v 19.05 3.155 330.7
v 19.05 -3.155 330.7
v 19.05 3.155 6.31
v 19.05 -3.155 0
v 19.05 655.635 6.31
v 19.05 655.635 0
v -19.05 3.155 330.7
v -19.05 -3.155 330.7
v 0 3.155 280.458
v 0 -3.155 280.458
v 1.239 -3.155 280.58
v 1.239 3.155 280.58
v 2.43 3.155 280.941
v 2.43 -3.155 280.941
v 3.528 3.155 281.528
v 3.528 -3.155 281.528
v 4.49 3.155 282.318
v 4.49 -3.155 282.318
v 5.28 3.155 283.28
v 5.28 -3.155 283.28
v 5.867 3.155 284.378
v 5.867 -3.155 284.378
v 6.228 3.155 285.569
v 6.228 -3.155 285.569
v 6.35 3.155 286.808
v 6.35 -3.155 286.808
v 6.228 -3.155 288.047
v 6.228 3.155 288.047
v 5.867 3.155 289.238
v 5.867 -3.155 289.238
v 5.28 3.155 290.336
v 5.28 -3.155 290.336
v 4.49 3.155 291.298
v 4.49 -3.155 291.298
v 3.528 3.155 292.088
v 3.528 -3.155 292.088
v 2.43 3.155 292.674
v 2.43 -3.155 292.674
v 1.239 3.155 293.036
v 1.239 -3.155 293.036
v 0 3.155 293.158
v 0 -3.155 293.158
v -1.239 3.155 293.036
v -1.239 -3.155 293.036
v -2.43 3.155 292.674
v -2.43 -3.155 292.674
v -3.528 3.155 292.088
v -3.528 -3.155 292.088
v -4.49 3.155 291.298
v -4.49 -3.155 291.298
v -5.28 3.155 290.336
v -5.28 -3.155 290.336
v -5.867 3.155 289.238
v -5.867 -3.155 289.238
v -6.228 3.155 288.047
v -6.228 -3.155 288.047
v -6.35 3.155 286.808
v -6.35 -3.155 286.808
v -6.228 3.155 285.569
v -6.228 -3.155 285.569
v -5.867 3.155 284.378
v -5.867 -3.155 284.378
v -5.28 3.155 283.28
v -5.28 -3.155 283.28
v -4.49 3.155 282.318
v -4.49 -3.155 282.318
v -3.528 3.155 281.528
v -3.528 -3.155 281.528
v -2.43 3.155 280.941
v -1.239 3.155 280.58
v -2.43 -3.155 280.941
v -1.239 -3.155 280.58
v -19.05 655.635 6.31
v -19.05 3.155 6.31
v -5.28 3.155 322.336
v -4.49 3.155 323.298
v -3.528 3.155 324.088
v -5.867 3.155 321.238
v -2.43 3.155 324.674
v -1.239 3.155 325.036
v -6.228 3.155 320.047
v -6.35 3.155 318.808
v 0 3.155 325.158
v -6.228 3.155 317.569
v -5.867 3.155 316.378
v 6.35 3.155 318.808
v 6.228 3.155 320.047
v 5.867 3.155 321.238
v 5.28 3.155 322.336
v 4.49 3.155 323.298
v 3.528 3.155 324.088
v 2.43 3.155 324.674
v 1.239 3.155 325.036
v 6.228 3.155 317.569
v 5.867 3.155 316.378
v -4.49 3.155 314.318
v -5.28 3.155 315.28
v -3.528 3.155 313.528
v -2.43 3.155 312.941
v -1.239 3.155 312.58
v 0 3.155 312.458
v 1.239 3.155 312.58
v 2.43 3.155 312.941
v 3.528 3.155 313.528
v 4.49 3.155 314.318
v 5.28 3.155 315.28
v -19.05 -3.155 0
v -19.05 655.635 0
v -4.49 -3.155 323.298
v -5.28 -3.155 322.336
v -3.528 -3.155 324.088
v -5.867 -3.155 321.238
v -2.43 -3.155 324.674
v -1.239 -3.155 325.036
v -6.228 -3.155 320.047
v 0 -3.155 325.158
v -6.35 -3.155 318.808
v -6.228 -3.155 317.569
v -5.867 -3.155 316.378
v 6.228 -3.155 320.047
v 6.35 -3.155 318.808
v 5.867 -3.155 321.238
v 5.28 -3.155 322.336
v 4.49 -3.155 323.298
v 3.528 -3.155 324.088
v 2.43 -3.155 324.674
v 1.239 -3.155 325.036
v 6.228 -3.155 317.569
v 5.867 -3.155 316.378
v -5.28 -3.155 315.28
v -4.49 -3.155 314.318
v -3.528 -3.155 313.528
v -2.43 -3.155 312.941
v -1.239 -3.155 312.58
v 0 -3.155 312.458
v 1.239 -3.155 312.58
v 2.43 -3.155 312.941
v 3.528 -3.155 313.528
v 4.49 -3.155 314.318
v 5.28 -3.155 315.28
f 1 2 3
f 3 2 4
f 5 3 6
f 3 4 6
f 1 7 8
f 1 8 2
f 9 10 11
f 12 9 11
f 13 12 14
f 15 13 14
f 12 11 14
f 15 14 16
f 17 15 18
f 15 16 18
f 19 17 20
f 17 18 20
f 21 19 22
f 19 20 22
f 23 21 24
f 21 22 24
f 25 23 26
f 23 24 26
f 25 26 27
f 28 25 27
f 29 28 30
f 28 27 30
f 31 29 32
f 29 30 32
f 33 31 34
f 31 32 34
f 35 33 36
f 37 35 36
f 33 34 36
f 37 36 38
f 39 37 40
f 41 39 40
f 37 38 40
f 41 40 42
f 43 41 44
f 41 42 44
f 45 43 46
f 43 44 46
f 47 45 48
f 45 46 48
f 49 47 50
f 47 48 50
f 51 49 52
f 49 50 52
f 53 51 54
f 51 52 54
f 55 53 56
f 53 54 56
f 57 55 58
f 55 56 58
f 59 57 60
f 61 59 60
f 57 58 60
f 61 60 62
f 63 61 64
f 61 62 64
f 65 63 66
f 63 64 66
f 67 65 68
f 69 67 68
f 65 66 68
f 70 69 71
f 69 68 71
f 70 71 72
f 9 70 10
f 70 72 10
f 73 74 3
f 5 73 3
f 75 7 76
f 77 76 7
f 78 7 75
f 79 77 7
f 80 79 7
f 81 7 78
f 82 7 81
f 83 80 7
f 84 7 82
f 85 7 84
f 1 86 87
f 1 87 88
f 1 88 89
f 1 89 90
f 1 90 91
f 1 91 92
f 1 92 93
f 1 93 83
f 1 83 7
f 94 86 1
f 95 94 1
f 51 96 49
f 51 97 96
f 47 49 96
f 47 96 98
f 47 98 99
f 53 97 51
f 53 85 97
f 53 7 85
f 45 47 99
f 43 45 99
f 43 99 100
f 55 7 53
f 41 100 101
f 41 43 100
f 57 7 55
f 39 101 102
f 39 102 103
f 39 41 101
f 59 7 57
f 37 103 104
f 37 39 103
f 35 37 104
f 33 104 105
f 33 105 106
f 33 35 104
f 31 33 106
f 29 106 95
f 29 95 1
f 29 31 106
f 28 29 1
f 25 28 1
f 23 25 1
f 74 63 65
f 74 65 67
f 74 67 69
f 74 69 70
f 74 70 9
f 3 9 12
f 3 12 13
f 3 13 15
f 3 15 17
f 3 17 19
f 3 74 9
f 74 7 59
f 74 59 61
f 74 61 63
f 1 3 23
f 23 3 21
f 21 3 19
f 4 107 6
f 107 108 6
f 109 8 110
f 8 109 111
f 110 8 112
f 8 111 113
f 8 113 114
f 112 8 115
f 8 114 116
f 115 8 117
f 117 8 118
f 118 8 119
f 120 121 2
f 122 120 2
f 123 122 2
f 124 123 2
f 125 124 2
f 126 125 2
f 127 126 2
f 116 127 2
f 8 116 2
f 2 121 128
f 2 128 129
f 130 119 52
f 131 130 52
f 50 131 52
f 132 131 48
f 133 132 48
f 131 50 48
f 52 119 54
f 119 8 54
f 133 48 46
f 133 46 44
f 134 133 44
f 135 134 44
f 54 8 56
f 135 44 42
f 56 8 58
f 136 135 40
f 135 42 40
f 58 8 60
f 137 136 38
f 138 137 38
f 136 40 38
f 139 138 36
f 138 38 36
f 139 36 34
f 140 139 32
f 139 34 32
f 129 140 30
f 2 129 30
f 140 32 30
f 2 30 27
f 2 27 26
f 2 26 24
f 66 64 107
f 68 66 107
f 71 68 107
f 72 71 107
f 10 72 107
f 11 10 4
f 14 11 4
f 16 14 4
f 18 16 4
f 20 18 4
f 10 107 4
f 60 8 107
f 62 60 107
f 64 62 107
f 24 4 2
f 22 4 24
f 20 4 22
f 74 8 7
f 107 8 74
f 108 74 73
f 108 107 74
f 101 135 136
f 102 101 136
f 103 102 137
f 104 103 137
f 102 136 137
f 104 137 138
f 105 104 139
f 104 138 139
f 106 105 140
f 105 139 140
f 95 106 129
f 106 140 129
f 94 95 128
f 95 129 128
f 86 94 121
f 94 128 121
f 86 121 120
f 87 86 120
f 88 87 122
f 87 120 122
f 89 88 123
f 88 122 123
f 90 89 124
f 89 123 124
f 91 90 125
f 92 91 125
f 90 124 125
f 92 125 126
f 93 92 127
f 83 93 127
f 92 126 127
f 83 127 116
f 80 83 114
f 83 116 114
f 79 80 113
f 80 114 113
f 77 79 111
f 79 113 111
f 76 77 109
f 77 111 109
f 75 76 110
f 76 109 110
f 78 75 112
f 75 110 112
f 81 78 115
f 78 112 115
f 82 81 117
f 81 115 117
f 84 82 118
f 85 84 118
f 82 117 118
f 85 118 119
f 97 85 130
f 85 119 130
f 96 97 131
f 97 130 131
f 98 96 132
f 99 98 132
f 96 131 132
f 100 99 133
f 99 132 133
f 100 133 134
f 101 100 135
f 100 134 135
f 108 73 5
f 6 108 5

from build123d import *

# Parameters (mm, degrees)
CROQUIS1_W              = 38.1
CROQUIS1_H              = 6.31
SALIENTE_EXTRUIR1_DEPTH = 330.7
CROQUIS3_W              = 38.1
CROQUIS3_H              = 6.31
SALIENTE_EXTRUIR2_DEPTH = 658.79
CROQUIS4_R              = 6.35
CORTAR_EXTRUIR1_DEPTH   = 6.31


with BuildPart() as part:
    # Croquis1 → Saliente-Extruir1 (new body)
    with BuildSketch(Plane.XY):
        Rectangle(CROQUIS1_W, CROQUIS1_H)
    extrude(amount=SALIENTE_EXTRUIR1_DEPTH)

    # Croquis3 → Saliente-Extruir2 (add)
    with BuildSketch(Plane.XZ.offset(3.155)):
        with Locations((0, 3.155)):
            Rectangle(CROQUIS3_W, CROQUIS3_H)
    extrude(amount=-SALIENTE_EXTRUIR2_DEPTH)

    # Croquis4 → Cortar-Extruir1 (cut)
    with BuildSketch(Plane(origin=(0, -3.155, 0), x_dir=(-1, 0, 0), z_dir=(0, -1, 0))):
        with Locations(Location((0, -286.807795334, 0), (0, 0, 90))):
            Circle(CROQUIS4_R)
        with Locations(Location((0, -318.807795334, 0), (0, 0, 90))):
            Circle(CROQUIS4_R)
    extrude(amount=-CORTAR_EXTRUIR1_DEPTH, mode=Mode.SUBTRACT)


solid = part.part
